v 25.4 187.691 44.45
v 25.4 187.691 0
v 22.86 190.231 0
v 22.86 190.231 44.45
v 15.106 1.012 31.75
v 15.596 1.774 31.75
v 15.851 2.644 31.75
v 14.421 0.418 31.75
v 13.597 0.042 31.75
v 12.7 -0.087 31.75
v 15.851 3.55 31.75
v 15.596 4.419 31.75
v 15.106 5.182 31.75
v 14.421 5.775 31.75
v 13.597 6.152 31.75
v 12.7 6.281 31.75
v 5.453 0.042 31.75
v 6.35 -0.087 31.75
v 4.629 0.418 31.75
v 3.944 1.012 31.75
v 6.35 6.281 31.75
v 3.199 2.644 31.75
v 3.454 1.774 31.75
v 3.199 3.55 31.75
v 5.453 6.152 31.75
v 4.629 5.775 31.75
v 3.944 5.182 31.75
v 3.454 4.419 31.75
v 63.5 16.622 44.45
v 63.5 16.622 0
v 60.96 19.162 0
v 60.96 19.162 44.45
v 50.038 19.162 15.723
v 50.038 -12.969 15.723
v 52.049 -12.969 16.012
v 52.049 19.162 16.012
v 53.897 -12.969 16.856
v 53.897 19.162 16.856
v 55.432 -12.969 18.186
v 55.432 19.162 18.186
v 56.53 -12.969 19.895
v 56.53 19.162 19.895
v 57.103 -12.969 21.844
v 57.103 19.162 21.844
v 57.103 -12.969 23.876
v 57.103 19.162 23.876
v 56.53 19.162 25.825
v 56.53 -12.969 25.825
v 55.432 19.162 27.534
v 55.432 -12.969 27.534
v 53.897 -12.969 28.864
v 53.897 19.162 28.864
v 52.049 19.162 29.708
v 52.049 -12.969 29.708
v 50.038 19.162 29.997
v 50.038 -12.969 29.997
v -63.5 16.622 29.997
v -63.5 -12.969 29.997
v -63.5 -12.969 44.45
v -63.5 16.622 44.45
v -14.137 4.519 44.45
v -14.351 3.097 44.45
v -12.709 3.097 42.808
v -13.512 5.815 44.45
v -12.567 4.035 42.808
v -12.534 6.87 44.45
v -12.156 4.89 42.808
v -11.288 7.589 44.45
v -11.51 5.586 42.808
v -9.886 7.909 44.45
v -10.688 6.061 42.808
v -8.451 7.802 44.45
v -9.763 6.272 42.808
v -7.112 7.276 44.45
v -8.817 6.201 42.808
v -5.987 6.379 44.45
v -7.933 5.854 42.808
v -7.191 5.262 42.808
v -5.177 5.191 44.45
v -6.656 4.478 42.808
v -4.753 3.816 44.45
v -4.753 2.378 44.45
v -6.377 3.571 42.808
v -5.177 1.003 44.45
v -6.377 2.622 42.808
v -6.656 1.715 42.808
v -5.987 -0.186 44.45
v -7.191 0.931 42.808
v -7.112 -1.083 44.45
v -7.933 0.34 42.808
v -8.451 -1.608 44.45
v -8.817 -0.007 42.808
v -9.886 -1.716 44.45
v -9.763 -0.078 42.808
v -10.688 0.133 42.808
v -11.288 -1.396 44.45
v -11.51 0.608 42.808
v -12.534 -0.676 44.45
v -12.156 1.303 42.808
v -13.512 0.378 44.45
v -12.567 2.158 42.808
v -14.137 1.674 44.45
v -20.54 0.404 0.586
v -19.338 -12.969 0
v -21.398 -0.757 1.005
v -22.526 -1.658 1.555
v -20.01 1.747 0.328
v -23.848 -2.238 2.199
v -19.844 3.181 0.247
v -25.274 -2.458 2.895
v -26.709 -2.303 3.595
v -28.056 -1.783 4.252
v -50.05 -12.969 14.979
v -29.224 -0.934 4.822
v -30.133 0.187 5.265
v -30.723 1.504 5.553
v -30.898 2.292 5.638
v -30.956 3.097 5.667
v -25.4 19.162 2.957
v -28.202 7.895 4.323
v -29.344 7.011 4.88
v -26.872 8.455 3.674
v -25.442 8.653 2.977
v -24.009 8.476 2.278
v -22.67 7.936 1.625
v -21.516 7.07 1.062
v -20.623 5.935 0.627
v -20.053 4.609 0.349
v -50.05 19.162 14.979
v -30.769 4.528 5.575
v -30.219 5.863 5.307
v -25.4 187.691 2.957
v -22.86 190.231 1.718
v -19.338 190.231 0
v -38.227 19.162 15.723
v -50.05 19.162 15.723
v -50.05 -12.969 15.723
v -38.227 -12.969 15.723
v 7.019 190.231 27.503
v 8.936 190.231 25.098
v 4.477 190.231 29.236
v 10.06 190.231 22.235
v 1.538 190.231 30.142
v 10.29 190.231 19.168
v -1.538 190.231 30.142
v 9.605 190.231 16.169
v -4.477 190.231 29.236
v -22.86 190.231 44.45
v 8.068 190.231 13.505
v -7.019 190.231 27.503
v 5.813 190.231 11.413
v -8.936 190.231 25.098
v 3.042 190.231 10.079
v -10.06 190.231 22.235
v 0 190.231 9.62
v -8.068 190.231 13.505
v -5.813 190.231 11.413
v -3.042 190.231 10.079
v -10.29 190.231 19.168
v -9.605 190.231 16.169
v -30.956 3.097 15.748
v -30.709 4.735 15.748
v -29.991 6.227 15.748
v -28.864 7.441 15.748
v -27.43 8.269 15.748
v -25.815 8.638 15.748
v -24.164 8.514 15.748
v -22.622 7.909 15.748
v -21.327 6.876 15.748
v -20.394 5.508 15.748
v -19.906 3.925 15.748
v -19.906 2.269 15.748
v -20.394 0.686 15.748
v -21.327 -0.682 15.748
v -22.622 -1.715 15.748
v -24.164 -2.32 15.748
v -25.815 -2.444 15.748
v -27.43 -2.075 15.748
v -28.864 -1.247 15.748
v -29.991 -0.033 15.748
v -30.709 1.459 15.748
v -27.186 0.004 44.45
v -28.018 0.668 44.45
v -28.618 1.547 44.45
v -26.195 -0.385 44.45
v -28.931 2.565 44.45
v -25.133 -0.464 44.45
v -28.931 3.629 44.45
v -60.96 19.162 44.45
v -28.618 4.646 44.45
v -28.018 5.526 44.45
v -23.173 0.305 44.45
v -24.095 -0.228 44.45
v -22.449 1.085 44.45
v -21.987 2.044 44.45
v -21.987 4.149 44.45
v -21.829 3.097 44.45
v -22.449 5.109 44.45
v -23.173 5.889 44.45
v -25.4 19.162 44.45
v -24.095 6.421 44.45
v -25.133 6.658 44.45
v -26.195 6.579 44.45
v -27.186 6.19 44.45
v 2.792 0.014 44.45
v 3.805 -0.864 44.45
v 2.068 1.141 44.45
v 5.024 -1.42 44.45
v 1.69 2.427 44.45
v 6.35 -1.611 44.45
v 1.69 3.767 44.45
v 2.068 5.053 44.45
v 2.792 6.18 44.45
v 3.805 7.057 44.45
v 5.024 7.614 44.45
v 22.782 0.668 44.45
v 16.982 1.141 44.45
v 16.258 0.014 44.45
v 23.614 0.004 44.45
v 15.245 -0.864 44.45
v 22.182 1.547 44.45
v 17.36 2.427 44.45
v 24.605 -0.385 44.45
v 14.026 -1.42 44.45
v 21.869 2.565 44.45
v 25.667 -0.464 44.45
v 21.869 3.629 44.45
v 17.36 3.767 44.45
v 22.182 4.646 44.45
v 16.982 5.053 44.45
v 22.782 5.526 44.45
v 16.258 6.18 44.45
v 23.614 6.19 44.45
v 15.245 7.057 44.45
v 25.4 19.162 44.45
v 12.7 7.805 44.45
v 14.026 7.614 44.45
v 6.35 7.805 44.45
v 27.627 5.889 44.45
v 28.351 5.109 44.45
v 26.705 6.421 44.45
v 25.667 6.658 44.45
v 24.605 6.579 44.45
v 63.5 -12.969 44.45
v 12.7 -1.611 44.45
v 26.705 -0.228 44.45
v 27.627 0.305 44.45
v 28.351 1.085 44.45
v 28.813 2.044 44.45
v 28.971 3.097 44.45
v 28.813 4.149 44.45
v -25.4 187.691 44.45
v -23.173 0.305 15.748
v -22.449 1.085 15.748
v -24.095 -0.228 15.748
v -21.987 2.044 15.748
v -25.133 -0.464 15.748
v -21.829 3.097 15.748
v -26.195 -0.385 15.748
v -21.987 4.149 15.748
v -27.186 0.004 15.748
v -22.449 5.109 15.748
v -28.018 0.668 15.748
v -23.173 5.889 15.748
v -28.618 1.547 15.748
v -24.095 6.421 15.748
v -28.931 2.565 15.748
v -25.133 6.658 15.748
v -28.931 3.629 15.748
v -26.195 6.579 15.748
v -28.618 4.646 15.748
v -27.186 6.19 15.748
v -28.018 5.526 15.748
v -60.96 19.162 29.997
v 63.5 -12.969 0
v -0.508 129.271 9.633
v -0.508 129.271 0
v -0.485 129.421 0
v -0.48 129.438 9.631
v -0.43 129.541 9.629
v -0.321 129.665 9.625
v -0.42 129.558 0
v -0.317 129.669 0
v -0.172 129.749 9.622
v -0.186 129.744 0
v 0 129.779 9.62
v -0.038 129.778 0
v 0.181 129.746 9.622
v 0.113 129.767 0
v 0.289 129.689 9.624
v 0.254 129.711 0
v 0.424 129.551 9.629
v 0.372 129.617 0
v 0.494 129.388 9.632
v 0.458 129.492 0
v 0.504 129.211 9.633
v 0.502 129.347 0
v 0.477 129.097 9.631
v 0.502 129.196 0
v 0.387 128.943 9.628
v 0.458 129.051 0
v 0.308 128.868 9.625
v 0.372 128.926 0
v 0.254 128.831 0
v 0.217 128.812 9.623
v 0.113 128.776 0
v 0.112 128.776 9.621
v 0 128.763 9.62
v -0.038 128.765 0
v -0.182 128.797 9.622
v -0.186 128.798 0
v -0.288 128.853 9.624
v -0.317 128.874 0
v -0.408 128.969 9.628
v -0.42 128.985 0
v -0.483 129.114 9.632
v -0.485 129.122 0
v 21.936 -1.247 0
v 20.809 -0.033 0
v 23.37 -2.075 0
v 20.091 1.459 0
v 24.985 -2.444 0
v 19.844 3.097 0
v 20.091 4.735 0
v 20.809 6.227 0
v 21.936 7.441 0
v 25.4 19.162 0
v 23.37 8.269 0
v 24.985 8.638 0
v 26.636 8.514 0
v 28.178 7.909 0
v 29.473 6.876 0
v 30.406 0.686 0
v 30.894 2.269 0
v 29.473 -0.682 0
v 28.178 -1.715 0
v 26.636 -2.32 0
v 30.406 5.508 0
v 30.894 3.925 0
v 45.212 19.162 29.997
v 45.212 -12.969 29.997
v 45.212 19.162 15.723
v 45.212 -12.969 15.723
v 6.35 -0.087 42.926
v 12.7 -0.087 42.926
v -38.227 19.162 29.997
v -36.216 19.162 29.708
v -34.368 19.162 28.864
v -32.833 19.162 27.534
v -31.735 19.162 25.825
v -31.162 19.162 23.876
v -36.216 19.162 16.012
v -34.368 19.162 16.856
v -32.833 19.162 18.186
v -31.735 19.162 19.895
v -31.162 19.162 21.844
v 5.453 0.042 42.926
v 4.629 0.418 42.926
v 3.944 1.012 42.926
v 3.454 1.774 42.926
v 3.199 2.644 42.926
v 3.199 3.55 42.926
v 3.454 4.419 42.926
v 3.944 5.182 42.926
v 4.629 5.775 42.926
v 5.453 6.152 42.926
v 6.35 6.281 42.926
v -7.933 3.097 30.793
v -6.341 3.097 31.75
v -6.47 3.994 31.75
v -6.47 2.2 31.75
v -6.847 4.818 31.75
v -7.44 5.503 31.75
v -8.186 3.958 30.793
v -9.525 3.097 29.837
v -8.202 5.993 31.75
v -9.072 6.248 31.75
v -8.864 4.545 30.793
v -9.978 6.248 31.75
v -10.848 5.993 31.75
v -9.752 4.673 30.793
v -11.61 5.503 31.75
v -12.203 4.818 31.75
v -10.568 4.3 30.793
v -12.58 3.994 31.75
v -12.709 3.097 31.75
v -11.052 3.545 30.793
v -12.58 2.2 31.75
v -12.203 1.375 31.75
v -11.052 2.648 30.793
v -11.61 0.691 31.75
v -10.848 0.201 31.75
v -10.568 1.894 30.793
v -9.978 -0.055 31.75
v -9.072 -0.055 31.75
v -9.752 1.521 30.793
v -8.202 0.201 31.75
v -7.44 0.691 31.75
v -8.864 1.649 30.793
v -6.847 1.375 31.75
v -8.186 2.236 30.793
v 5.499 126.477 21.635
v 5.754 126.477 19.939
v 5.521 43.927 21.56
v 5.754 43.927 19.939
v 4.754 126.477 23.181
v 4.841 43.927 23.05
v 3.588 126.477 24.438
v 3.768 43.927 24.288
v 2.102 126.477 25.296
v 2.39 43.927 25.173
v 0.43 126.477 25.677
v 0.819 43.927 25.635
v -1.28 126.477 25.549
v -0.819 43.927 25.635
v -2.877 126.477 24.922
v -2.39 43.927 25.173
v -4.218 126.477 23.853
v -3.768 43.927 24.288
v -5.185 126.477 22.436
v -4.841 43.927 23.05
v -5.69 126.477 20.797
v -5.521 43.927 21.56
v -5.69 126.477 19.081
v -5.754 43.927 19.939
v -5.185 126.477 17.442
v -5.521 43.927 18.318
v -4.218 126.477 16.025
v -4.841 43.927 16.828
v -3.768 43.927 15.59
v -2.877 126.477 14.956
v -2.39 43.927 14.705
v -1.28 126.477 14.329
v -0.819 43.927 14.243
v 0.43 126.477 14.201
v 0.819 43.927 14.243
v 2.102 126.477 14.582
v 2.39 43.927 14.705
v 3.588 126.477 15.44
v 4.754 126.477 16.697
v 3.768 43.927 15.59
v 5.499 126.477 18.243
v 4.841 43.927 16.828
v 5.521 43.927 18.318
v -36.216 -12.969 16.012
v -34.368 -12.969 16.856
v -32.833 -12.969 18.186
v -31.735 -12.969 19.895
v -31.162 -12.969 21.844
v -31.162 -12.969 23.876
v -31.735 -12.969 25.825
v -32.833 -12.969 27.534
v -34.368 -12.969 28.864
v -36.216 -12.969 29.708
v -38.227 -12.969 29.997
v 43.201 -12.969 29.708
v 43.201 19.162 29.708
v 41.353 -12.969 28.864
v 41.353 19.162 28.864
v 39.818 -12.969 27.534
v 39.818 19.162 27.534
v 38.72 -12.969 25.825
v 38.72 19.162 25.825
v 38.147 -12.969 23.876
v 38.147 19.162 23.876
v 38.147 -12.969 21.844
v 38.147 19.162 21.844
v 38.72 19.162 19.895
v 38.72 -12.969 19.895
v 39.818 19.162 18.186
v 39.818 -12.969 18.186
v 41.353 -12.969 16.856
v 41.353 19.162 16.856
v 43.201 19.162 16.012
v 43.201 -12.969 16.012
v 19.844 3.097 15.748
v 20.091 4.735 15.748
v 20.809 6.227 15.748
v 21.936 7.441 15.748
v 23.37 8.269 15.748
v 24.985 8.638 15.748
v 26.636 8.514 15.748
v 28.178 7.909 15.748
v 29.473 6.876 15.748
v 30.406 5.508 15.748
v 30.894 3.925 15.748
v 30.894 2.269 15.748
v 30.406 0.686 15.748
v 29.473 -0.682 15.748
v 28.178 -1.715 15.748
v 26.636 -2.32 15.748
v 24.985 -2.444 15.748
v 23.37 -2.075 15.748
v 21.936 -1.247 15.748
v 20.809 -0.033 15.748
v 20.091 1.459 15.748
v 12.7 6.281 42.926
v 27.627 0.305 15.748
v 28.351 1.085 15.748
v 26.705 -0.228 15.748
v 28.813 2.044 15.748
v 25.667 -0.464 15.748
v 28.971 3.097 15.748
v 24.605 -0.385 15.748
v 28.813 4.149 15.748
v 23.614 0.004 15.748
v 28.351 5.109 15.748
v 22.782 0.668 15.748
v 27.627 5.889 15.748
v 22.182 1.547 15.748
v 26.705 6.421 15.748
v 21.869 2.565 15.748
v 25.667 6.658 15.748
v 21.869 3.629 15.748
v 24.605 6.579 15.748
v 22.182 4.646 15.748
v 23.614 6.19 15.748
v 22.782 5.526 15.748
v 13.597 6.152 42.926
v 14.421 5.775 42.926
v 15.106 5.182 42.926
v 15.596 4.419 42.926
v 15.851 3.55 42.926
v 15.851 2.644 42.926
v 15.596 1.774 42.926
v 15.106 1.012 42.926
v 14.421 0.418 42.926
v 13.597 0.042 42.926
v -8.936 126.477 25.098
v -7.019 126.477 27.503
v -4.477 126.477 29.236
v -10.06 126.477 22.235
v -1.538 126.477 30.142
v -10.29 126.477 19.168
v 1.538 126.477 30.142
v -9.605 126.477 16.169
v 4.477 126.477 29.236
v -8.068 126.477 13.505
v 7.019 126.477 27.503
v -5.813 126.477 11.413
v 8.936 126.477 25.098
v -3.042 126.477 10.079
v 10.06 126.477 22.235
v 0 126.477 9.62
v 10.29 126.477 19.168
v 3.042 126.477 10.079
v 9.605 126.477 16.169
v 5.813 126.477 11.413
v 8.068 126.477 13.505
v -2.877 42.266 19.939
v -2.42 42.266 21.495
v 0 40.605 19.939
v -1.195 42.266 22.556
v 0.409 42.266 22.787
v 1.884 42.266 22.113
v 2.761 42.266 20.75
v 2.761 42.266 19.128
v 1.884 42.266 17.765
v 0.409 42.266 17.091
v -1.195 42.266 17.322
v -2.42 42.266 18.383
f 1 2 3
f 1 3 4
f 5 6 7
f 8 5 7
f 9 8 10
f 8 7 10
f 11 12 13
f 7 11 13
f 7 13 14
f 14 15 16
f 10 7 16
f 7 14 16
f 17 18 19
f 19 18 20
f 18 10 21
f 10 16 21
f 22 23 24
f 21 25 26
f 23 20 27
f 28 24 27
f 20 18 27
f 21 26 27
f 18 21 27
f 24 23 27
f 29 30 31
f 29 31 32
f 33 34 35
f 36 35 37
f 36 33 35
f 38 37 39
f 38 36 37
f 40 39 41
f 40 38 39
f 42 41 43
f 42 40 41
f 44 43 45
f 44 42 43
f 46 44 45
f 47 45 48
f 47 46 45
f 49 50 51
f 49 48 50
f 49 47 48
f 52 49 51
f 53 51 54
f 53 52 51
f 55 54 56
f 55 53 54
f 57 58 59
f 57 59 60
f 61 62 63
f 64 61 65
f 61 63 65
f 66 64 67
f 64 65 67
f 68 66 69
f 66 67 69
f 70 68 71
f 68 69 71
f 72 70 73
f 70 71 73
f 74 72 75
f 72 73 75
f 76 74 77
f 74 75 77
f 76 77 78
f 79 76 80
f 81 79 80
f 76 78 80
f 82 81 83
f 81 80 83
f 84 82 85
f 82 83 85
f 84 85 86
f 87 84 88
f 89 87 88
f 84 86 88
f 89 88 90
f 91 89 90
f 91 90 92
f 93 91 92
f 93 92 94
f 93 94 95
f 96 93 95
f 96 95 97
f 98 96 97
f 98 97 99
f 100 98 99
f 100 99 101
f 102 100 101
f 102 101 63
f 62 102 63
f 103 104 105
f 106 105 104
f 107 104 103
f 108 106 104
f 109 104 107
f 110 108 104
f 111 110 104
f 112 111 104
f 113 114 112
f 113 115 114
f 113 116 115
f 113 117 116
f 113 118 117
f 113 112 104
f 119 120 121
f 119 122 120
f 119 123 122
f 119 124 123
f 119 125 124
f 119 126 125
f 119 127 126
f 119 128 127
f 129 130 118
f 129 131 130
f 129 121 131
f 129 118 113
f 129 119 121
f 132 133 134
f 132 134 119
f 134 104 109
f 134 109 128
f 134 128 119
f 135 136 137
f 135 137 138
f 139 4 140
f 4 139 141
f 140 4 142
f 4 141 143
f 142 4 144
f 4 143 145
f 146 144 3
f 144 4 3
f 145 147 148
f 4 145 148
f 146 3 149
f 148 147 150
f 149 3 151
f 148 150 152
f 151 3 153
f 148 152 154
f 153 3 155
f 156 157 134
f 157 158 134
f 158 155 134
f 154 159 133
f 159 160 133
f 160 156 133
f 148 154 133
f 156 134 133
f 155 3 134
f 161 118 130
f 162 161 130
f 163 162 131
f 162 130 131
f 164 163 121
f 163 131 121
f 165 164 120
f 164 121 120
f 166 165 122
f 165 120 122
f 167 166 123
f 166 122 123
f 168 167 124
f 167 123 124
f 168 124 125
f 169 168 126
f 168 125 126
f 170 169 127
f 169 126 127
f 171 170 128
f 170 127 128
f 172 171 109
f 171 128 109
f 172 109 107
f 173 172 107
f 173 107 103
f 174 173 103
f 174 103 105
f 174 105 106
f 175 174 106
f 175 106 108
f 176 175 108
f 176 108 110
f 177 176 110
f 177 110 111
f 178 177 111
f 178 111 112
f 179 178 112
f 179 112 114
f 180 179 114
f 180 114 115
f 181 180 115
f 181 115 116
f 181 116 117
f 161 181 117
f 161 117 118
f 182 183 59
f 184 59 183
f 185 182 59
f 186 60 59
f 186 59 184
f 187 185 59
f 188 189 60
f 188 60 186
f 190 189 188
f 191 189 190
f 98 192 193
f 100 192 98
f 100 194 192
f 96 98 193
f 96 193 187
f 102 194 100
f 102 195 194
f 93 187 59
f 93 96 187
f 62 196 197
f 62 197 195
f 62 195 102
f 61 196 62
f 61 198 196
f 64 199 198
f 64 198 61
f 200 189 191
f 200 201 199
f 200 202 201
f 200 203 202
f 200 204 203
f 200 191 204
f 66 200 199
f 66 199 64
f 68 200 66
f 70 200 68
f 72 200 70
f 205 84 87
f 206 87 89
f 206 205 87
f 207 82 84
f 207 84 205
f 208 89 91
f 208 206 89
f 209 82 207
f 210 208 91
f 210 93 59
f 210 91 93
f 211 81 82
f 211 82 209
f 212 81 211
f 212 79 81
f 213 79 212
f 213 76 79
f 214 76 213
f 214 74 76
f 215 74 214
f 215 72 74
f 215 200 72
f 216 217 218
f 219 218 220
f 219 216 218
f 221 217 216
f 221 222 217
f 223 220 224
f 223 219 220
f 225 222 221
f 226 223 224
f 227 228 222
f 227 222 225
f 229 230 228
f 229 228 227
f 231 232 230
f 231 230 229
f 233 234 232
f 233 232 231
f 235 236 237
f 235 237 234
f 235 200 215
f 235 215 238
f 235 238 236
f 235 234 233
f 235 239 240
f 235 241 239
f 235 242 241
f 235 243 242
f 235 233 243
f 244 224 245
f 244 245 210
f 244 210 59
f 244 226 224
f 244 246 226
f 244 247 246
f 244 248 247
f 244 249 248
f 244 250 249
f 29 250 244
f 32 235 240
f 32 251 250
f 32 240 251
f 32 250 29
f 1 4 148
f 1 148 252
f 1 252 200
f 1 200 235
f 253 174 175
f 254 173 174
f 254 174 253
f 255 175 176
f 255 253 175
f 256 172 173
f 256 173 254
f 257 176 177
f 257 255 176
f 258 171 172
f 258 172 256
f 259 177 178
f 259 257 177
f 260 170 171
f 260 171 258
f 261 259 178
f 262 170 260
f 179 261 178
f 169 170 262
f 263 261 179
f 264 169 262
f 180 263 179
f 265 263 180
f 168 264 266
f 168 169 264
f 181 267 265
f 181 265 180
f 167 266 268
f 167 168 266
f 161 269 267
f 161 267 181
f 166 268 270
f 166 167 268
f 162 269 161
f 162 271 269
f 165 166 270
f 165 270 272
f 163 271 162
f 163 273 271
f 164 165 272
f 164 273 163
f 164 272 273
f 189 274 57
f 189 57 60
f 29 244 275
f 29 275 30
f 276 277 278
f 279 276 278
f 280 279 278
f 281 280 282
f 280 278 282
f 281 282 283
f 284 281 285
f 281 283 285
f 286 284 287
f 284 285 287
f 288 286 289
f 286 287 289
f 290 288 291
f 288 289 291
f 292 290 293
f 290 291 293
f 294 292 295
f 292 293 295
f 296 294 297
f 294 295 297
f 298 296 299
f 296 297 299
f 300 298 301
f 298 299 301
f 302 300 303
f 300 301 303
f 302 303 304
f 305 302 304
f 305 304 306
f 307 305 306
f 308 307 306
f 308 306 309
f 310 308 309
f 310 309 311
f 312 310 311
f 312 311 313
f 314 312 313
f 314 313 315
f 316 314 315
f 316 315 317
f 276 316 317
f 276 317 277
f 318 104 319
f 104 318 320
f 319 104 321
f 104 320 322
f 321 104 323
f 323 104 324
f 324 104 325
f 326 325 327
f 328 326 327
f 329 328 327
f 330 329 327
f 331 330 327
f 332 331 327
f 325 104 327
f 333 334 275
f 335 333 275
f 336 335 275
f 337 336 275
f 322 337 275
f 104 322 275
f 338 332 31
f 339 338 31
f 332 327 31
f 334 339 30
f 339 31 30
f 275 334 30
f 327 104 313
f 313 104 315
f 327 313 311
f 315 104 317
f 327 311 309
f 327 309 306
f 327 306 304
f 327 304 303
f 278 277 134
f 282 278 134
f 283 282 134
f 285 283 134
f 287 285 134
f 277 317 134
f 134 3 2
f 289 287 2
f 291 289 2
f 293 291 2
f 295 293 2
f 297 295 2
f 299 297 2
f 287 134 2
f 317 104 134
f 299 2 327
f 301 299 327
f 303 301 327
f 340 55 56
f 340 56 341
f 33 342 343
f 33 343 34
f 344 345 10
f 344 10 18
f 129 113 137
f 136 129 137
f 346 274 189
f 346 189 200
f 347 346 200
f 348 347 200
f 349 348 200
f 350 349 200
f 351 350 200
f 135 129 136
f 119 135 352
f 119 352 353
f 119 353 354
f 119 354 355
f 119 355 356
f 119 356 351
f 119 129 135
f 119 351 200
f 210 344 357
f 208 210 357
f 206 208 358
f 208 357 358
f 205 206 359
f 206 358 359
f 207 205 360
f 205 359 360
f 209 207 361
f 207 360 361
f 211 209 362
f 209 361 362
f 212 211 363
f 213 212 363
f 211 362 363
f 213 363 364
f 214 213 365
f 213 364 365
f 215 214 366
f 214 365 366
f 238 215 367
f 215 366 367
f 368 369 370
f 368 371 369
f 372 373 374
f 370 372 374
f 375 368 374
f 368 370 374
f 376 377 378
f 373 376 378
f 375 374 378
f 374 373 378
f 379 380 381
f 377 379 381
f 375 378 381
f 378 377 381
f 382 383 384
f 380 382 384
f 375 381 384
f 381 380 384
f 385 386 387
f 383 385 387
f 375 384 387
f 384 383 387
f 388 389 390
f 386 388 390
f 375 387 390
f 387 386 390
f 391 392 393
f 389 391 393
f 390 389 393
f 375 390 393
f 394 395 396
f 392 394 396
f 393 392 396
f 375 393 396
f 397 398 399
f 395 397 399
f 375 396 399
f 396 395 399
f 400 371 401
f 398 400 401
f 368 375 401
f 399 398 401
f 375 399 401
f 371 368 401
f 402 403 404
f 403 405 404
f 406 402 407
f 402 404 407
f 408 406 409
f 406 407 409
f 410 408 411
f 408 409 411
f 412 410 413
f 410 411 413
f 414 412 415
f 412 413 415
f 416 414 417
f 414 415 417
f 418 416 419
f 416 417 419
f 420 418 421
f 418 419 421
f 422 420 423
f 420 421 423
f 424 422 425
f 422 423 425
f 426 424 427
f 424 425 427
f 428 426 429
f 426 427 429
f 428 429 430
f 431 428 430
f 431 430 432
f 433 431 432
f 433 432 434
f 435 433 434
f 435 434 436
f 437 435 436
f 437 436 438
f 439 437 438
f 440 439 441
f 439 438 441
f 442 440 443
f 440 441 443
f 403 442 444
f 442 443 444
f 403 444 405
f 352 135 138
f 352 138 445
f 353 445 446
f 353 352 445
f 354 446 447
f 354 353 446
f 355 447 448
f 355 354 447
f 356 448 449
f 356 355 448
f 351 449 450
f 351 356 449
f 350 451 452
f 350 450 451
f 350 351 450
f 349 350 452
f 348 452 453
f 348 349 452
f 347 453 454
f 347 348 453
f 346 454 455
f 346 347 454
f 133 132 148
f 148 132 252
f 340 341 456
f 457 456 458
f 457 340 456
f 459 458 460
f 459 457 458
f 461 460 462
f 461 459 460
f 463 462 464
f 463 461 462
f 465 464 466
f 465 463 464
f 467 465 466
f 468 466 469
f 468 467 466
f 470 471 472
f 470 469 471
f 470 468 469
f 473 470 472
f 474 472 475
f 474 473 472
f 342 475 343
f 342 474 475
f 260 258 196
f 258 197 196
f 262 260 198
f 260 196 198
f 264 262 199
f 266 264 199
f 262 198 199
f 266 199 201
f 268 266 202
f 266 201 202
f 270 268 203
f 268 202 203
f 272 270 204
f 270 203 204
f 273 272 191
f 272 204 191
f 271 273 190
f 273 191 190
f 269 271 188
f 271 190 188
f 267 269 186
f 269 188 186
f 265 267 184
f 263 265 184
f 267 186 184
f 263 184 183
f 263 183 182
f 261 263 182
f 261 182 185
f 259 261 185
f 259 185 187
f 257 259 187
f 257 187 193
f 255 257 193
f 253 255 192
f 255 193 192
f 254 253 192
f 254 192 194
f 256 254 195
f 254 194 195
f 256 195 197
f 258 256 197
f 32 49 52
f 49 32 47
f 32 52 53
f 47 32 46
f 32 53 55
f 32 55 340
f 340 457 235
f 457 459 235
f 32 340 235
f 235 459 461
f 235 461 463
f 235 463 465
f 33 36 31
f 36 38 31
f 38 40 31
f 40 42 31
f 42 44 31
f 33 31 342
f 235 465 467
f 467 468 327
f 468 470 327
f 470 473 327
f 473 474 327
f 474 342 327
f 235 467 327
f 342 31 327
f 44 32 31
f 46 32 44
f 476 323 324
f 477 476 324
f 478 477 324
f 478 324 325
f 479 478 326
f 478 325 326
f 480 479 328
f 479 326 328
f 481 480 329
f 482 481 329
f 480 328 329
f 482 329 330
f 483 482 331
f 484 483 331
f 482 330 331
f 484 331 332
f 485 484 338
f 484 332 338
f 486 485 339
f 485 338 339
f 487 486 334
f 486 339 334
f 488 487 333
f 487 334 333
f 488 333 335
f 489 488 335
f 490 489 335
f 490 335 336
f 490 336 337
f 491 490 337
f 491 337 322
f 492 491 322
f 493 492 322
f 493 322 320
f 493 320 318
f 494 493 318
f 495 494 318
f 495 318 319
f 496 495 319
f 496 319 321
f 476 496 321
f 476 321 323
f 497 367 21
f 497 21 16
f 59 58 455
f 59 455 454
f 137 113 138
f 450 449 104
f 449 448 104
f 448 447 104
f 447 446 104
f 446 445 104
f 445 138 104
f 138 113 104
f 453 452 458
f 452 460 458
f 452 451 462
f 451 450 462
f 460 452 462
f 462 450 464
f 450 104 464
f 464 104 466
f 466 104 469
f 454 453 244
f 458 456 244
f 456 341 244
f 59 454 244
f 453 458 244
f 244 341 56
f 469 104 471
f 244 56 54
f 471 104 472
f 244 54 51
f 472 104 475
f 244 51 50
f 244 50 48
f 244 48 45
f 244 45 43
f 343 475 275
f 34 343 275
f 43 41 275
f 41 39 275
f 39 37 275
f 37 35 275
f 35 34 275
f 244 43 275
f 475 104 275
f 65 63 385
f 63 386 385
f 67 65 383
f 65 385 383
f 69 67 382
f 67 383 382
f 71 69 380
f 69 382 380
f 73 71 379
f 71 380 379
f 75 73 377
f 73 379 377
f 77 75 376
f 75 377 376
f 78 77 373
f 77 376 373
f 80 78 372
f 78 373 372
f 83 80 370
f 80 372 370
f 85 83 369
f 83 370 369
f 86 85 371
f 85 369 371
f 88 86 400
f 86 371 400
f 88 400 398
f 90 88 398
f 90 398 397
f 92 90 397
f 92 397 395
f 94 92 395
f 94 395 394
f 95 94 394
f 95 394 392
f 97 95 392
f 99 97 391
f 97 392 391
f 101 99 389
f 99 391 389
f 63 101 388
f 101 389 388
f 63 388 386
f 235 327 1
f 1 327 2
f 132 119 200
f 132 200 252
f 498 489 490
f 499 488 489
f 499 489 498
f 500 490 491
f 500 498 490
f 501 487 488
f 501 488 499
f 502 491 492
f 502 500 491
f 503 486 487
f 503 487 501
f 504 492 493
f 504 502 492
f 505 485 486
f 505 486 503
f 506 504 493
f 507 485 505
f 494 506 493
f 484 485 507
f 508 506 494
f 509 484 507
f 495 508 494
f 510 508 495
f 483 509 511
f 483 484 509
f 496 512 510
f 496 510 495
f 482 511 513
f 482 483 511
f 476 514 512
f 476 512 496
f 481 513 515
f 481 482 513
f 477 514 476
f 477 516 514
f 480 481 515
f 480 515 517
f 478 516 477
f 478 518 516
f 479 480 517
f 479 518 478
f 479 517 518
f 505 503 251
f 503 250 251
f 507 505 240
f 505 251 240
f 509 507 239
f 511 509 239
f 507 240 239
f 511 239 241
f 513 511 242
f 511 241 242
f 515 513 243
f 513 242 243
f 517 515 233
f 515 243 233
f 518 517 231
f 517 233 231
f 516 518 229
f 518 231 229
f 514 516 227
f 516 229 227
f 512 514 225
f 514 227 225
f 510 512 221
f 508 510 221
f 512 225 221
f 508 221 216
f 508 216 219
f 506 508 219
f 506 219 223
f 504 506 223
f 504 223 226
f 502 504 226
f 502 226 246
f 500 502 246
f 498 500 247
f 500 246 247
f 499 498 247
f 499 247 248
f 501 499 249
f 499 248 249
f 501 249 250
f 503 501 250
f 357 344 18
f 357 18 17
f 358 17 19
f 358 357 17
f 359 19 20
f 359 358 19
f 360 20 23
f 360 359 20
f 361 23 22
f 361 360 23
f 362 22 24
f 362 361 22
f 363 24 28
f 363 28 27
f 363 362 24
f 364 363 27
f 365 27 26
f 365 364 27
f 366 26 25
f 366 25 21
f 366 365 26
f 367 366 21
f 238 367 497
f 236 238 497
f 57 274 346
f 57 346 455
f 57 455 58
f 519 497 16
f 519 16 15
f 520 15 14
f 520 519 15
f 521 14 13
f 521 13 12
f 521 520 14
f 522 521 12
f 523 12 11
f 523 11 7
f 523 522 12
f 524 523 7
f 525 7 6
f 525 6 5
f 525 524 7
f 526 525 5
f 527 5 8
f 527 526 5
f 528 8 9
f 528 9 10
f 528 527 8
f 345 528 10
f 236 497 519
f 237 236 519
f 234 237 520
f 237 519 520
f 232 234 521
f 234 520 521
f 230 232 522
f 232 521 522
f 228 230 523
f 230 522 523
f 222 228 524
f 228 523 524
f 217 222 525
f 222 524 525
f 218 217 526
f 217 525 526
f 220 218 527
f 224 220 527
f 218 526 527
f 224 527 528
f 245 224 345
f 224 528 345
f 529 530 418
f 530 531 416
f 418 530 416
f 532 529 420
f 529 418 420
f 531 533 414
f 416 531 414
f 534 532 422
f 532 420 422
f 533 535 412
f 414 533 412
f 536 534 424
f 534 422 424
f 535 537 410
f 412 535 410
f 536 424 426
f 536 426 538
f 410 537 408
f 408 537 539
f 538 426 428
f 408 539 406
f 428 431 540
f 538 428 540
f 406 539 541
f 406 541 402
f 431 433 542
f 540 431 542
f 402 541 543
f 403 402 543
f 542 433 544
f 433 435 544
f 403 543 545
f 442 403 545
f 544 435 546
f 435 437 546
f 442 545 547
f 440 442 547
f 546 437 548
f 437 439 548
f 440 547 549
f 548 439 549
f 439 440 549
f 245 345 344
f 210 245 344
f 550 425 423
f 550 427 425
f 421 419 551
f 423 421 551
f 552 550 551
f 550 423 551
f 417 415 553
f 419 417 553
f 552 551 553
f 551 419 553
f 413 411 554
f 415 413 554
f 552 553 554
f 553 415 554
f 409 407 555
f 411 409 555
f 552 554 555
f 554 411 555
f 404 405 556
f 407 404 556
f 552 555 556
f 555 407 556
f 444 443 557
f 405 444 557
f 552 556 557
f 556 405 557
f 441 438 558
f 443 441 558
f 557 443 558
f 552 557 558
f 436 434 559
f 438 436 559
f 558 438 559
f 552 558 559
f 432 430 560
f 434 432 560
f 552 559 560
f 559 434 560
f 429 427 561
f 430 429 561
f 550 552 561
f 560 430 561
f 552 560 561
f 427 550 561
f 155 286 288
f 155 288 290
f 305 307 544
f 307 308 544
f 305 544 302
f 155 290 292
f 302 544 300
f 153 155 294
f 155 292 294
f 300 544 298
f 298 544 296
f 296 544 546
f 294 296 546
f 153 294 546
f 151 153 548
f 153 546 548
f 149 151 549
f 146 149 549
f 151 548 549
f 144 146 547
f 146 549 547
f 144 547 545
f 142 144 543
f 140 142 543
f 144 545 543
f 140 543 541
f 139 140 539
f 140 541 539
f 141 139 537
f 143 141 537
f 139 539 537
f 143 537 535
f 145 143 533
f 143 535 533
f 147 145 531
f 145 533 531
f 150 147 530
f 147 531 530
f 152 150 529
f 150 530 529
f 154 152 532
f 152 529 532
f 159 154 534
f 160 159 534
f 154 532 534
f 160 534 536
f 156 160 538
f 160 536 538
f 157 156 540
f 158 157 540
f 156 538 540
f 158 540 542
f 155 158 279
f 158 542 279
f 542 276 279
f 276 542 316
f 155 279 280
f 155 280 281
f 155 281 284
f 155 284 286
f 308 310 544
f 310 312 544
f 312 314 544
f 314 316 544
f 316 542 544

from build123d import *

# Parameters (mm, degrees)
EXTRUDE1_DEPTH                                   = 44.45
CHAMFER1_SIZE                                    = 2.54
CHAMFER2_SIZE                                    = 2.54
F_13_16_0_8125_DIAMETER_HOLE1_D                  = 20.6375
F_13_16_0_8125_DIAMETER_HOLE1_DEPTH              = 63.754
F_60_0_04_DIAMETER_HOLE1_REACH                   = 46.45
F_60_0_04_DIAMETER_HOLE1_BORE_R                  = 0.508
CBORE_FOR_1_4_SOCKET_HEAD_CAP_SCREW1_D           = 7.14248
CBORE_FOR_1_4_SOCKET_HEAD_CAP_SCREW1_CBORE_D     = 11.1125
CBORE_FOR_1_4_SOCKET_HEAD_CAP_SCREW1_CBORE_DEPTH = 15.748
F_1_4_0_25_DIAMETER_HOLE2_D                      = 6.36778
F_1_4_0_25_DIAMETER_HOLE2_DEPTH                  = 12.7
F_1_4_0_25_DIAMETER_HOLE2_CSINK_D                = 9.652
F_1_4_0_25_DIAMETER_HOLE2_CSINK_ANGLE            = 90
F_1_4_0_25_DIAMETER_HOLE2_TIP                    = 1.913074116
EXTRUDE4_DEPTH                                   = 12.7
F_1_2_20_TAPPED_HOLE3_D                          = 11.50874
F_1_2_20_TAPPED_HOLE3_DEPTH                      = 82.55
F_1_2_20_TAPPED_HOLE3_TIP                        = 3.322287069
EXTRUDE5_DEPTH                                   = 172.0690001
EXTRUDE5_DEPTH_BACK                              = 33.02
CHAMFER3_SIZE                                    = 1.524
EXTRUDE6_DEPTH                                   = 33.131
CUT_EXTRUDE1_DEPTH                               = 33.131


with BuildPart() as part:
    # Sketch1 → Extrude1 (new body)
    with BuildSketch(Plane.XY):
        Polygon((-63.5, 19.16234013), (-25.4, 19.16234013), (-25.4, 190.23134013), (0, 190.23134013), (0, -12.96865987), (-63.5, -12.96865987), align=None)
    extrude1 = extrude(amount=EXTRUDE1_DEPTH)

    # Mirror2: Extrude1 across plane
    add(extrude1.mirror(Plane(origin=(0, -12.96865987, 44.45), x_dir=(0, 0, 1), z_dir=(-1, 0, 0))))

    # Chamfer1
    chamfer1_edges = [part.edges().sort_by_distance(p)[0] for p in [
        (63.5, 19.16234013, 22.225),
        (25.4, 190.23134013, 22.225),
    ]]
    chamfer(chamfer1_edges, length=CHAMFER1_SIZE)

    # Chamfer2
    chamfer2_edges = [part.edges().sort_by_distance(p)[0] for p in [
        (-63.5, 19.16234013, 22.225),
        (-25.4, 190.23134013, 22.225),
    ]]
    chamfer(chamfer2_edges, length=CHAMFER2_SIZE)

    # 13/16 (0.8125) Diameter Hole1
    with Locations(Plane(origin=(0, 190.23134013, 19.939), x_dir=(0, 0, 1), z_dir=(0, 1, 0))):
        with Locations((0, 0)):
            Hole(F_13_16_0_8125_DIAMETER_HOLE1_D / 2, depth=F_13_16_0_8125_DIAMETER_HOLE1_DEPTH)

    # #60 (0.04) Diameter Hole1 bore → #60 (0.04) Diameter Hole1 (cut, up to next)
    with BuildSketch(Plane(origin=(0, 0, 0), x_dir=(-1, 0, 0), z_dir=(0, 0, -1)), mode=Mode.PRIVATE) as f_60_0_04_diameter_hole1_sk1:
        with Locations((0, 129.27134013)):
            Circle(F_60_0_04_DIAMETER_HOLE1_BORE_R)
    f_60_0_04_diameter_hole1_tool1 = extrude(f_60_0_04_diameter_hole1_sk1.sketch, amount=-F_60_0_04_DIAMETER_HOLE1_REACH, mode=Mode.PRIVATE) & part.part
    add(f_60_0_04_diameter_hole1_tool1.solids().sort_by_distance((0, 129.27134, 0))[0], mode=Mode.SUBTRACT)

    # CBORE for 1/4 Socket Head Cap Screw1 (through all)
    with Locations(Plane(origin=(25.4, 3.09684013, 0), x_dir=(-1, 0, 0), z_dir=(0, 0, -1))):
        with Locations((0, 0), (50.8, 0)):
            CounterBoreHole(CBORE_FOR_1_4_SOCKET_HEAD_CAP_SCREW1_D / 2, CBORE_FOR_1_4_SOCKET_HEAD_CAP_SCREW1_CBORE_D / 2, CBORE_FOR_1_4_SOCKET_HEAD_CAP_SCREW1_CBORE_DEPTH)

    # 1/4 (0.25) Diameter Hole2
    with Locations(Plane.XY.offset(44.45)):
        with Locations((-9.525, 3.09684013)):
            CounterSinkHole(F_1_4_0_25_DIAMETER_HOLE2_D / 2, F_1_4_0_25_DIAMETER_HOLE2_CSINK_D / 2, depth=F_1_4_0_25_DIAMETER_HOLE2_DEPTH, counter_sink_angle=F_1_4_0_25_DIAMETER_HOLE2_CSINK_ANGLE)
            with Locations((0, 0, -(F_1_4_0_25_DIAMETER_HOLE2_DEPTH + F_1_4_0_25_DIAMETER_HOLE2_TIP / 2))):  # 118° drill point
                Cone(0, F_1_4_0_25_DIAMETER_HOLE2_D / 2, F_1_4_0_25_DIAMETER_HOLE2_TIP, mode=Mode.SUBTRACT)

    # Sketch22 → Extrude4 (cut)
    with BuildSketch(Plane.XY.offset(44.45)):
        with BuildLine():
            Line((12.7, -0.08704987), (6.35, -0.08704987))
            ThreePointArc((6.35, -0.08704987), (3.16611, 3.09684013), (6.35, 6.28073013))
            Line((6.35, 6.28073013), (12.7, 6.28073013))
            ThreePointArc((12.7, 6.28073013), (15.88389, 3.09684013), (12.7, -0.08704987))
        make_face()
    extrude(amount=-EXTRUDE4_DEPTH, mode=Mode.SUBTRACT)

    # 1/2-20 Tapped Hole3
    with Locations(Plane(origin=(0, 126.47734013, 0), x_dir=(-1, 0, 0), z_dir=(0, 1, 0))):
        with Locations((0, 19.939)):
            Hole(F_1_2_20_TAPPED_HOLE3_D / 2, depth=F_1_2_20_TAPPED_HOLE3_DEPTH)
            with Locations((0, 0, -(F_1_2_20_TAPPED_HOLE3_DEPTH + F_1_2_20_TAPPED_HOLE3_TIP / 2))):  # 120° drill point
                Cone(0, F_1_2_20_TAPPED_HOLE3_D / 2, F_1_2_20_TAPPED_HOLE3_TIP, mode=Mode.SUBTRACT)

    # Sketch27 → Extrude5 (cut, two sides)
    with BuildSketch(Plane(origin=(0, 19.16234013, 0), x_dir=(1, 0, 0), z_dir=(0, 1, 0))) as extrude5_sk:
        Polygon((-19.338095495, 0), (-63.5, -21.5392), (-63.5, 0), align=None)
    extrude(amount=EXTRUDE5_DEPTH, mode=Mode.SUBTRACT)
    extrude(extrude5_sk.sketch, amount=-EXTRUDE5_DEPTH_BACK, mode=Mode.SUBTRACT)

    # Chamfer3
    chamfer3_edges = [part.edges().sort_by_distance(p)[0] for p in [
        (15.88389, 3.09684013, 44.45),
        (9.525, 6.28073013, 44.45),
        (3.16611, 3.09684013, 44.45),
        (9.525, -0.08704987, 44.45),
    ]]
    chamfer(chamfer3_edges, length=CHAMFER3_SIZE)

    # Sketch28 → Extrude6 (cut, through all)
    with BuildSketch(Plane(origin=(0, 19.16234013, 0), x_dir=(1, 0, 0), z_dir=(0, 1, 0))):
        with BuildLine():
            Line((45.212, -15.7226), (50.038, -15.7226))
            ThreePointArc((50.038, -15.7226), (57.1754, -22.86), (50.038, -29.9974))
            Line((50.038, -29.9974), (45.212, -29.9974))
            ThreePointArc((45.212, -29.9974), (38.0746, -22.86), (45.212, -15.7226))
        make_face()
        with BuildLine():
            Line((-38.227, -29.9974), (-63.627, -29.9974))
            ThreePointArc((-63.627, -29.9974), (-70.7644, -22.86), (-63.627, -15.7226))
            Line((-63.627, -15.7226), (-38.227, -15.7226))
            ThreePointArc((-38.227, -15.7226), (-31.0896, -22.86), (-38.227, -29.9974))
        make_face()
    extrude(amount=-EXTRUDE6_DEPTH, mode=Mode.SUBTRACT)

    # Sketch29 → Cut-Extrude1 (cut, through all)
    with BuildSketch(Plane(origin=(0, 19.16234013, 0), x_dir=(1, 0, 0), z_dir=(0, 1, 0))):
        Polygon((-51.574202675, -15.7226), (-50.050202675, -14.979295535), (-50.050202675, -15.7226), align=None)
    extrude(amount=-CUT_EXTRUDE1_DEPTH, mode=Mode.SUBTRACT)


solid = part.part
